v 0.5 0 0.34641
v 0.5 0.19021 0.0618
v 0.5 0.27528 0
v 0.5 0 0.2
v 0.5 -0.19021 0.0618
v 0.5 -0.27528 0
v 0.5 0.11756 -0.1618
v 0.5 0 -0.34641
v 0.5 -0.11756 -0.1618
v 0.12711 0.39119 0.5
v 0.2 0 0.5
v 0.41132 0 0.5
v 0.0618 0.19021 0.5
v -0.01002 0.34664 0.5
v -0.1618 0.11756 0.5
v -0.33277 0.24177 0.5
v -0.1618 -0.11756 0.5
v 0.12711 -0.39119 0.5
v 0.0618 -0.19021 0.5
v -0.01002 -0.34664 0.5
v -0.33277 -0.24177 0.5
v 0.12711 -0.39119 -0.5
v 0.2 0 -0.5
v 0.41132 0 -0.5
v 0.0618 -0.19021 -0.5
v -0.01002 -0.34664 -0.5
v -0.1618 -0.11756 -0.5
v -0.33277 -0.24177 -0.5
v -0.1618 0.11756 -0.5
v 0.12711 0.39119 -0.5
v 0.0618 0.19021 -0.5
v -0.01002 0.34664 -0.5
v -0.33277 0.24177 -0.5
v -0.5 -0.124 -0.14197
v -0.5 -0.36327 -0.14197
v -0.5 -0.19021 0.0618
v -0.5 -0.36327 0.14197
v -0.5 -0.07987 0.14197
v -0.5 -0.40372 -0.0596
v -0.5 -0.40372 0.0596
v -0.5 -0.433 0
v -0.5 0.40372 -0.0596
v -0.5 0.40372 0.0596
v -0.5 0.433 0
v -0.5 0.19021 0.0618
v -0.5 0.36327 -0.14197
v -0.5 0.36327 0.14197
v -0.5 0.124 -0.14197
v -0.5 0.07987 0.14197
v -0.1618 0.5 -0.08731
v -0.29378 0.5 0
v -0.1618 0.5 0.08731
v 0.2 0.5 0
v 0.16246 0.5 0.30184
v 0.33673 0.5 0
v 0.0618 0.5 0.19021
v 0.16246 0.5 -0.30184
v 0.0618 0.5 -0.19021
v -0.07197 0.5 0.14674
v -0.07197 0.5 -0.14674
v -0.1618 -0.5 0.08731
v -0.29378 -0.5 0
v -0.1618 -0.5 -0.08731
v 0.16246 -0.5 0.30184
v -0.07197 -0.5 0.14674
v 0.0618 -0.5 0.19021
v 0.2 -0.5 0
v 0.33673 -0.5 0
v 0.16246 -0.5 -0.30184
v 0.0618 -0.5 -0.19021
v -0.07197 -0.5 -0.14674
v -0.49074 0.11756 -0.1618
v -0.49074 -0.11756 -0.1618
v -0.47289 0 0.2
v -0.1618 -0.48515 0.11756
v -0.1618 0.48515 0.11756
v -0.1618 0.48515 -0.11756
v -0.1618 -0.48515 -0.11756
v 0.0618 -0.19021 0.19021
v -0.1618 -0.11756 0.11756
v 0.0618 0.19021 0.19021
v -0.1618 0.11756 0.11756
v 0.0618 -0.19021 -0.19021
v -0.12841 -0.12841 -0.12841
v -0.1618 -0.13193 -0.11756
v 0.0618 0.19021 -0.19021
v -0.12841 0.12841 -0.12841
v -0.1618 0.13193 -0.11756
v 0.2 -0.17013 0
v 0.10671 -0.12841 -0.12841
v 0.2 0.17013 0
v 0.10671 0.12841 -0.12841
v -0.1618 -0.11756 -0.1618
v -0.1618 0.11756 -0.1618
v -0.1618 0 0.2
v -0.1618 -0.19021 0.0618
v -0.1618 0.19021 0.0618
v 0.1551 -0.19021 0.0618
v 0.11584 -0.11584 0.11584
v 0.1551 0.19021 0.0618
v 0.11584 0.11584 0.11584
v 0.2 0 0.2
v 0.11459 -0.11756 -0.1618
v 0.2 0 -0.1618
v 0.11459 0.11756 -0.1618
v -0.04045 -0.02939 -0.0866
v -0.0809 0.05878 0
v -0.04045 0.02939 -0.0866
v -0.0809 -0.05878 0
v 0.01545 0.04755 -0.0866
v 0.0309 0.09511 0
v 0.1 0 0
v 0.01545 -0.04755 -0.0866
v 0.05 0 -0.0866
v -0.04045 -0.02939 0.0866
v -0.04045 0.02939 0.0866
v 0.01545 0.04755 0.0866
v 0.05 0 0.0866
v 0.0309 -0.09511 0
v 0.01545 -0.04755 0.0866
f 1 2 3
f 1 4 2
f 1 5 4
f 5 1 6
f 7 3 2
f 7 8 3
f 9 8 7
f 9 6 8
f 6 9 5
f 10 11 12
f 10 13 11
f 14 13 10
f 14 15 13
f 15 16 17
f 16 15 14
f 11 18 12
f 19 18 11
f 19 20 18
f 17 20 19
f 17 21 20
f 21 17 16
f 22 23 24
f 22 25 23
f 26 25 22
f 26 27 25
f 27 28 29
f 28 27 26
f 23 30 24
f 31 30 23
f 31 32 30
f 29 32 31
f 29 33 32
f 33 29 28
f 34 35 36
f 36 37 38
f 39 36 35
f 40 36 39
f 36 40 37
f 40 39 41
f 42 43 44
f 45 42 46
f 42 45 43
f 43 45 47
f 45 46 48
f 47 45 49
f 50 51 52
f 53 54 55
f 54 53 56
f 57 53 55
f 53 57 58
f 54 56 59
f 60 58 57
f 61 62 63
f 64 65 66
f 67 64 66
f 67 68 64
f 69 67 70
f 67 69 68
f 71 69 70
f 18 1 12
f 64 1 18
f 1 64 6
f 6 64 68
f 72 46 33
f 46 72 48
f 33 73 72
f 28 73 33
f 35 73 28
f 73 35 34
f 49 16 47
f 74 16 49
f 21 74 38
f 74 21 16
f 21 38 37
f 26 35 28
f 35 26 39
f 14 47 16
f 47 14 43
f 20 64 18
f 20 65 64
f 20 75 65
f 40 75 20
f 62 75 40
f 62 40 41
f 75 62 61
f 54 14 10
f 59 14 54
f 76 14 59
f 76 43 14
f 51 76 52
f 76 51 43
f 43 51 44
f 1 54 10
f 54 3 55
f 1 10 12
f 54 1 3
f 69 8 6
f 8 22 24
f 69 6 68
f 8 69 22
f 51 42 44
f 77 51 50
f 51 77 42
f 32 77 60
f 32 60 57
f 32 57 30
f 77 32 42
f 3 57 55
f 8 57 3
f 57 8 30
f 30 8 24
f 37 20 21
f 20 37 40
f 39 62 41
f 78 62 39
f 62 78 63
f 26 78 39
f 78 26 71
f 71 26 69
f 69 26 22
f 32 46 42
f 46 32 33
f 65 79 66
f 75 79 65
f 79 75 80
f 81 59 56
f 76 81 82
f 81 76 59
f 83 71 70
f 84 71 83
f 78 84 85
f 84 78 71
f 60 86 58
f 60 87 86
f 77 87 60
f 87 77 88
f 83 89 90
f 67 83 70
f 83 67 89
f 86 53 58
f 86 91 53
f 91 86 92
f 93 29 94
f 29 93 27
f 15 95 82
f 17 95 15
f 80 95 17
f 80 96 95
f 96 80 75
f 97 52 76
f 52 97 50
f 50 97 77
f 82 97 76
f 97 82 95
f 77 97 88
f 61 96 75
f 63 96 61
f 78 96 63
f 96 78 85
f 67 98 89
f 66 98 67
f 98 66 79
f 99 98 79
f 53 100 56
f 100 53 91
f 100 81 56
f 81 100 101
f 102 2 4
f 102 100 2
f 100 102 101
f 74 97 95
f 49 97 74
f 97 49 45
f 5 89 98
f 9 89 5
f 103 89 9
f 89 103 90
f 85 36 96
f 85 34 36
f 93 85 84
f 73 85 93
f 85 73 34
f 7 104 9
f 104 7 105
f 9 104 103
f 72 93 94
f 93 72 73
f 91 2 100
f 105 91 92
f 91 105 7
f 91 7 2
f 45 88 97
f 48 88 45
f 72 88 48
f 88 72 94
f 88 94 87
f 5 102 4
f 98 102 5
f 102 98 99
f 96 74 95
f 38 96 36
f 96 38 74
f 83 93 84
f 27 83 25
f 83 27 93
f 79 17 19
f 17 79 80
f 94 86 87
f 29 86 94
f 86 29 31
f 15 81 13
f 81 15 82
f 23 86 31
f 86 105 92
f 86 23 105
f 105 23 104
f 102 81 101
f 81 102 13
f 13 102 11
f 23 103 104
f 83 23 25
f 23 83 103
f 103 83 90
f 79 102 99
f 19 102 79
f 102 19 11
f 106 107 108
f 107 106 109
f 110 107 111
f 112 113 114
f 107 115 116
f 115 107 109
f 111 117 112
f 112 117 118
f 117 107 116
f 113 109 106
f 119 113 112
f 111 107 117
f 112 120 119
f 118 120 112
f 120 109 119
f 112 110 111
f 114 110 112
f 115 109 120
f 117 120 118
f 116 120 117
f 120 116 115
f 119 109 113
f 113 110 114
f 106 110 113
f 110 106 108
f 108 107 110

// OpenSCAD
union(){
difference(){
intersection(){
    translate([-.5,-.5,-.5])
        color("blue")
        cube();
    color("purple")
    sphere(0.7);
}
union(){
    
    translate([0,0,-.5])
        color([.5,0,.6])
        cylinder(r=0.2,h=2);
    union(){
    rotate([-90,0,0])
    translate([0,0,-.5])
        color([.5,0,.6])
        cylinder(r=0.2,h=2);
        
        rotate([0,-90,0])
    translate([0,0,-.5])
        color([.5,0,.6])
        cylinder(r=0.2,h=2);
    }
}
}

    sphere(0.1);
}
